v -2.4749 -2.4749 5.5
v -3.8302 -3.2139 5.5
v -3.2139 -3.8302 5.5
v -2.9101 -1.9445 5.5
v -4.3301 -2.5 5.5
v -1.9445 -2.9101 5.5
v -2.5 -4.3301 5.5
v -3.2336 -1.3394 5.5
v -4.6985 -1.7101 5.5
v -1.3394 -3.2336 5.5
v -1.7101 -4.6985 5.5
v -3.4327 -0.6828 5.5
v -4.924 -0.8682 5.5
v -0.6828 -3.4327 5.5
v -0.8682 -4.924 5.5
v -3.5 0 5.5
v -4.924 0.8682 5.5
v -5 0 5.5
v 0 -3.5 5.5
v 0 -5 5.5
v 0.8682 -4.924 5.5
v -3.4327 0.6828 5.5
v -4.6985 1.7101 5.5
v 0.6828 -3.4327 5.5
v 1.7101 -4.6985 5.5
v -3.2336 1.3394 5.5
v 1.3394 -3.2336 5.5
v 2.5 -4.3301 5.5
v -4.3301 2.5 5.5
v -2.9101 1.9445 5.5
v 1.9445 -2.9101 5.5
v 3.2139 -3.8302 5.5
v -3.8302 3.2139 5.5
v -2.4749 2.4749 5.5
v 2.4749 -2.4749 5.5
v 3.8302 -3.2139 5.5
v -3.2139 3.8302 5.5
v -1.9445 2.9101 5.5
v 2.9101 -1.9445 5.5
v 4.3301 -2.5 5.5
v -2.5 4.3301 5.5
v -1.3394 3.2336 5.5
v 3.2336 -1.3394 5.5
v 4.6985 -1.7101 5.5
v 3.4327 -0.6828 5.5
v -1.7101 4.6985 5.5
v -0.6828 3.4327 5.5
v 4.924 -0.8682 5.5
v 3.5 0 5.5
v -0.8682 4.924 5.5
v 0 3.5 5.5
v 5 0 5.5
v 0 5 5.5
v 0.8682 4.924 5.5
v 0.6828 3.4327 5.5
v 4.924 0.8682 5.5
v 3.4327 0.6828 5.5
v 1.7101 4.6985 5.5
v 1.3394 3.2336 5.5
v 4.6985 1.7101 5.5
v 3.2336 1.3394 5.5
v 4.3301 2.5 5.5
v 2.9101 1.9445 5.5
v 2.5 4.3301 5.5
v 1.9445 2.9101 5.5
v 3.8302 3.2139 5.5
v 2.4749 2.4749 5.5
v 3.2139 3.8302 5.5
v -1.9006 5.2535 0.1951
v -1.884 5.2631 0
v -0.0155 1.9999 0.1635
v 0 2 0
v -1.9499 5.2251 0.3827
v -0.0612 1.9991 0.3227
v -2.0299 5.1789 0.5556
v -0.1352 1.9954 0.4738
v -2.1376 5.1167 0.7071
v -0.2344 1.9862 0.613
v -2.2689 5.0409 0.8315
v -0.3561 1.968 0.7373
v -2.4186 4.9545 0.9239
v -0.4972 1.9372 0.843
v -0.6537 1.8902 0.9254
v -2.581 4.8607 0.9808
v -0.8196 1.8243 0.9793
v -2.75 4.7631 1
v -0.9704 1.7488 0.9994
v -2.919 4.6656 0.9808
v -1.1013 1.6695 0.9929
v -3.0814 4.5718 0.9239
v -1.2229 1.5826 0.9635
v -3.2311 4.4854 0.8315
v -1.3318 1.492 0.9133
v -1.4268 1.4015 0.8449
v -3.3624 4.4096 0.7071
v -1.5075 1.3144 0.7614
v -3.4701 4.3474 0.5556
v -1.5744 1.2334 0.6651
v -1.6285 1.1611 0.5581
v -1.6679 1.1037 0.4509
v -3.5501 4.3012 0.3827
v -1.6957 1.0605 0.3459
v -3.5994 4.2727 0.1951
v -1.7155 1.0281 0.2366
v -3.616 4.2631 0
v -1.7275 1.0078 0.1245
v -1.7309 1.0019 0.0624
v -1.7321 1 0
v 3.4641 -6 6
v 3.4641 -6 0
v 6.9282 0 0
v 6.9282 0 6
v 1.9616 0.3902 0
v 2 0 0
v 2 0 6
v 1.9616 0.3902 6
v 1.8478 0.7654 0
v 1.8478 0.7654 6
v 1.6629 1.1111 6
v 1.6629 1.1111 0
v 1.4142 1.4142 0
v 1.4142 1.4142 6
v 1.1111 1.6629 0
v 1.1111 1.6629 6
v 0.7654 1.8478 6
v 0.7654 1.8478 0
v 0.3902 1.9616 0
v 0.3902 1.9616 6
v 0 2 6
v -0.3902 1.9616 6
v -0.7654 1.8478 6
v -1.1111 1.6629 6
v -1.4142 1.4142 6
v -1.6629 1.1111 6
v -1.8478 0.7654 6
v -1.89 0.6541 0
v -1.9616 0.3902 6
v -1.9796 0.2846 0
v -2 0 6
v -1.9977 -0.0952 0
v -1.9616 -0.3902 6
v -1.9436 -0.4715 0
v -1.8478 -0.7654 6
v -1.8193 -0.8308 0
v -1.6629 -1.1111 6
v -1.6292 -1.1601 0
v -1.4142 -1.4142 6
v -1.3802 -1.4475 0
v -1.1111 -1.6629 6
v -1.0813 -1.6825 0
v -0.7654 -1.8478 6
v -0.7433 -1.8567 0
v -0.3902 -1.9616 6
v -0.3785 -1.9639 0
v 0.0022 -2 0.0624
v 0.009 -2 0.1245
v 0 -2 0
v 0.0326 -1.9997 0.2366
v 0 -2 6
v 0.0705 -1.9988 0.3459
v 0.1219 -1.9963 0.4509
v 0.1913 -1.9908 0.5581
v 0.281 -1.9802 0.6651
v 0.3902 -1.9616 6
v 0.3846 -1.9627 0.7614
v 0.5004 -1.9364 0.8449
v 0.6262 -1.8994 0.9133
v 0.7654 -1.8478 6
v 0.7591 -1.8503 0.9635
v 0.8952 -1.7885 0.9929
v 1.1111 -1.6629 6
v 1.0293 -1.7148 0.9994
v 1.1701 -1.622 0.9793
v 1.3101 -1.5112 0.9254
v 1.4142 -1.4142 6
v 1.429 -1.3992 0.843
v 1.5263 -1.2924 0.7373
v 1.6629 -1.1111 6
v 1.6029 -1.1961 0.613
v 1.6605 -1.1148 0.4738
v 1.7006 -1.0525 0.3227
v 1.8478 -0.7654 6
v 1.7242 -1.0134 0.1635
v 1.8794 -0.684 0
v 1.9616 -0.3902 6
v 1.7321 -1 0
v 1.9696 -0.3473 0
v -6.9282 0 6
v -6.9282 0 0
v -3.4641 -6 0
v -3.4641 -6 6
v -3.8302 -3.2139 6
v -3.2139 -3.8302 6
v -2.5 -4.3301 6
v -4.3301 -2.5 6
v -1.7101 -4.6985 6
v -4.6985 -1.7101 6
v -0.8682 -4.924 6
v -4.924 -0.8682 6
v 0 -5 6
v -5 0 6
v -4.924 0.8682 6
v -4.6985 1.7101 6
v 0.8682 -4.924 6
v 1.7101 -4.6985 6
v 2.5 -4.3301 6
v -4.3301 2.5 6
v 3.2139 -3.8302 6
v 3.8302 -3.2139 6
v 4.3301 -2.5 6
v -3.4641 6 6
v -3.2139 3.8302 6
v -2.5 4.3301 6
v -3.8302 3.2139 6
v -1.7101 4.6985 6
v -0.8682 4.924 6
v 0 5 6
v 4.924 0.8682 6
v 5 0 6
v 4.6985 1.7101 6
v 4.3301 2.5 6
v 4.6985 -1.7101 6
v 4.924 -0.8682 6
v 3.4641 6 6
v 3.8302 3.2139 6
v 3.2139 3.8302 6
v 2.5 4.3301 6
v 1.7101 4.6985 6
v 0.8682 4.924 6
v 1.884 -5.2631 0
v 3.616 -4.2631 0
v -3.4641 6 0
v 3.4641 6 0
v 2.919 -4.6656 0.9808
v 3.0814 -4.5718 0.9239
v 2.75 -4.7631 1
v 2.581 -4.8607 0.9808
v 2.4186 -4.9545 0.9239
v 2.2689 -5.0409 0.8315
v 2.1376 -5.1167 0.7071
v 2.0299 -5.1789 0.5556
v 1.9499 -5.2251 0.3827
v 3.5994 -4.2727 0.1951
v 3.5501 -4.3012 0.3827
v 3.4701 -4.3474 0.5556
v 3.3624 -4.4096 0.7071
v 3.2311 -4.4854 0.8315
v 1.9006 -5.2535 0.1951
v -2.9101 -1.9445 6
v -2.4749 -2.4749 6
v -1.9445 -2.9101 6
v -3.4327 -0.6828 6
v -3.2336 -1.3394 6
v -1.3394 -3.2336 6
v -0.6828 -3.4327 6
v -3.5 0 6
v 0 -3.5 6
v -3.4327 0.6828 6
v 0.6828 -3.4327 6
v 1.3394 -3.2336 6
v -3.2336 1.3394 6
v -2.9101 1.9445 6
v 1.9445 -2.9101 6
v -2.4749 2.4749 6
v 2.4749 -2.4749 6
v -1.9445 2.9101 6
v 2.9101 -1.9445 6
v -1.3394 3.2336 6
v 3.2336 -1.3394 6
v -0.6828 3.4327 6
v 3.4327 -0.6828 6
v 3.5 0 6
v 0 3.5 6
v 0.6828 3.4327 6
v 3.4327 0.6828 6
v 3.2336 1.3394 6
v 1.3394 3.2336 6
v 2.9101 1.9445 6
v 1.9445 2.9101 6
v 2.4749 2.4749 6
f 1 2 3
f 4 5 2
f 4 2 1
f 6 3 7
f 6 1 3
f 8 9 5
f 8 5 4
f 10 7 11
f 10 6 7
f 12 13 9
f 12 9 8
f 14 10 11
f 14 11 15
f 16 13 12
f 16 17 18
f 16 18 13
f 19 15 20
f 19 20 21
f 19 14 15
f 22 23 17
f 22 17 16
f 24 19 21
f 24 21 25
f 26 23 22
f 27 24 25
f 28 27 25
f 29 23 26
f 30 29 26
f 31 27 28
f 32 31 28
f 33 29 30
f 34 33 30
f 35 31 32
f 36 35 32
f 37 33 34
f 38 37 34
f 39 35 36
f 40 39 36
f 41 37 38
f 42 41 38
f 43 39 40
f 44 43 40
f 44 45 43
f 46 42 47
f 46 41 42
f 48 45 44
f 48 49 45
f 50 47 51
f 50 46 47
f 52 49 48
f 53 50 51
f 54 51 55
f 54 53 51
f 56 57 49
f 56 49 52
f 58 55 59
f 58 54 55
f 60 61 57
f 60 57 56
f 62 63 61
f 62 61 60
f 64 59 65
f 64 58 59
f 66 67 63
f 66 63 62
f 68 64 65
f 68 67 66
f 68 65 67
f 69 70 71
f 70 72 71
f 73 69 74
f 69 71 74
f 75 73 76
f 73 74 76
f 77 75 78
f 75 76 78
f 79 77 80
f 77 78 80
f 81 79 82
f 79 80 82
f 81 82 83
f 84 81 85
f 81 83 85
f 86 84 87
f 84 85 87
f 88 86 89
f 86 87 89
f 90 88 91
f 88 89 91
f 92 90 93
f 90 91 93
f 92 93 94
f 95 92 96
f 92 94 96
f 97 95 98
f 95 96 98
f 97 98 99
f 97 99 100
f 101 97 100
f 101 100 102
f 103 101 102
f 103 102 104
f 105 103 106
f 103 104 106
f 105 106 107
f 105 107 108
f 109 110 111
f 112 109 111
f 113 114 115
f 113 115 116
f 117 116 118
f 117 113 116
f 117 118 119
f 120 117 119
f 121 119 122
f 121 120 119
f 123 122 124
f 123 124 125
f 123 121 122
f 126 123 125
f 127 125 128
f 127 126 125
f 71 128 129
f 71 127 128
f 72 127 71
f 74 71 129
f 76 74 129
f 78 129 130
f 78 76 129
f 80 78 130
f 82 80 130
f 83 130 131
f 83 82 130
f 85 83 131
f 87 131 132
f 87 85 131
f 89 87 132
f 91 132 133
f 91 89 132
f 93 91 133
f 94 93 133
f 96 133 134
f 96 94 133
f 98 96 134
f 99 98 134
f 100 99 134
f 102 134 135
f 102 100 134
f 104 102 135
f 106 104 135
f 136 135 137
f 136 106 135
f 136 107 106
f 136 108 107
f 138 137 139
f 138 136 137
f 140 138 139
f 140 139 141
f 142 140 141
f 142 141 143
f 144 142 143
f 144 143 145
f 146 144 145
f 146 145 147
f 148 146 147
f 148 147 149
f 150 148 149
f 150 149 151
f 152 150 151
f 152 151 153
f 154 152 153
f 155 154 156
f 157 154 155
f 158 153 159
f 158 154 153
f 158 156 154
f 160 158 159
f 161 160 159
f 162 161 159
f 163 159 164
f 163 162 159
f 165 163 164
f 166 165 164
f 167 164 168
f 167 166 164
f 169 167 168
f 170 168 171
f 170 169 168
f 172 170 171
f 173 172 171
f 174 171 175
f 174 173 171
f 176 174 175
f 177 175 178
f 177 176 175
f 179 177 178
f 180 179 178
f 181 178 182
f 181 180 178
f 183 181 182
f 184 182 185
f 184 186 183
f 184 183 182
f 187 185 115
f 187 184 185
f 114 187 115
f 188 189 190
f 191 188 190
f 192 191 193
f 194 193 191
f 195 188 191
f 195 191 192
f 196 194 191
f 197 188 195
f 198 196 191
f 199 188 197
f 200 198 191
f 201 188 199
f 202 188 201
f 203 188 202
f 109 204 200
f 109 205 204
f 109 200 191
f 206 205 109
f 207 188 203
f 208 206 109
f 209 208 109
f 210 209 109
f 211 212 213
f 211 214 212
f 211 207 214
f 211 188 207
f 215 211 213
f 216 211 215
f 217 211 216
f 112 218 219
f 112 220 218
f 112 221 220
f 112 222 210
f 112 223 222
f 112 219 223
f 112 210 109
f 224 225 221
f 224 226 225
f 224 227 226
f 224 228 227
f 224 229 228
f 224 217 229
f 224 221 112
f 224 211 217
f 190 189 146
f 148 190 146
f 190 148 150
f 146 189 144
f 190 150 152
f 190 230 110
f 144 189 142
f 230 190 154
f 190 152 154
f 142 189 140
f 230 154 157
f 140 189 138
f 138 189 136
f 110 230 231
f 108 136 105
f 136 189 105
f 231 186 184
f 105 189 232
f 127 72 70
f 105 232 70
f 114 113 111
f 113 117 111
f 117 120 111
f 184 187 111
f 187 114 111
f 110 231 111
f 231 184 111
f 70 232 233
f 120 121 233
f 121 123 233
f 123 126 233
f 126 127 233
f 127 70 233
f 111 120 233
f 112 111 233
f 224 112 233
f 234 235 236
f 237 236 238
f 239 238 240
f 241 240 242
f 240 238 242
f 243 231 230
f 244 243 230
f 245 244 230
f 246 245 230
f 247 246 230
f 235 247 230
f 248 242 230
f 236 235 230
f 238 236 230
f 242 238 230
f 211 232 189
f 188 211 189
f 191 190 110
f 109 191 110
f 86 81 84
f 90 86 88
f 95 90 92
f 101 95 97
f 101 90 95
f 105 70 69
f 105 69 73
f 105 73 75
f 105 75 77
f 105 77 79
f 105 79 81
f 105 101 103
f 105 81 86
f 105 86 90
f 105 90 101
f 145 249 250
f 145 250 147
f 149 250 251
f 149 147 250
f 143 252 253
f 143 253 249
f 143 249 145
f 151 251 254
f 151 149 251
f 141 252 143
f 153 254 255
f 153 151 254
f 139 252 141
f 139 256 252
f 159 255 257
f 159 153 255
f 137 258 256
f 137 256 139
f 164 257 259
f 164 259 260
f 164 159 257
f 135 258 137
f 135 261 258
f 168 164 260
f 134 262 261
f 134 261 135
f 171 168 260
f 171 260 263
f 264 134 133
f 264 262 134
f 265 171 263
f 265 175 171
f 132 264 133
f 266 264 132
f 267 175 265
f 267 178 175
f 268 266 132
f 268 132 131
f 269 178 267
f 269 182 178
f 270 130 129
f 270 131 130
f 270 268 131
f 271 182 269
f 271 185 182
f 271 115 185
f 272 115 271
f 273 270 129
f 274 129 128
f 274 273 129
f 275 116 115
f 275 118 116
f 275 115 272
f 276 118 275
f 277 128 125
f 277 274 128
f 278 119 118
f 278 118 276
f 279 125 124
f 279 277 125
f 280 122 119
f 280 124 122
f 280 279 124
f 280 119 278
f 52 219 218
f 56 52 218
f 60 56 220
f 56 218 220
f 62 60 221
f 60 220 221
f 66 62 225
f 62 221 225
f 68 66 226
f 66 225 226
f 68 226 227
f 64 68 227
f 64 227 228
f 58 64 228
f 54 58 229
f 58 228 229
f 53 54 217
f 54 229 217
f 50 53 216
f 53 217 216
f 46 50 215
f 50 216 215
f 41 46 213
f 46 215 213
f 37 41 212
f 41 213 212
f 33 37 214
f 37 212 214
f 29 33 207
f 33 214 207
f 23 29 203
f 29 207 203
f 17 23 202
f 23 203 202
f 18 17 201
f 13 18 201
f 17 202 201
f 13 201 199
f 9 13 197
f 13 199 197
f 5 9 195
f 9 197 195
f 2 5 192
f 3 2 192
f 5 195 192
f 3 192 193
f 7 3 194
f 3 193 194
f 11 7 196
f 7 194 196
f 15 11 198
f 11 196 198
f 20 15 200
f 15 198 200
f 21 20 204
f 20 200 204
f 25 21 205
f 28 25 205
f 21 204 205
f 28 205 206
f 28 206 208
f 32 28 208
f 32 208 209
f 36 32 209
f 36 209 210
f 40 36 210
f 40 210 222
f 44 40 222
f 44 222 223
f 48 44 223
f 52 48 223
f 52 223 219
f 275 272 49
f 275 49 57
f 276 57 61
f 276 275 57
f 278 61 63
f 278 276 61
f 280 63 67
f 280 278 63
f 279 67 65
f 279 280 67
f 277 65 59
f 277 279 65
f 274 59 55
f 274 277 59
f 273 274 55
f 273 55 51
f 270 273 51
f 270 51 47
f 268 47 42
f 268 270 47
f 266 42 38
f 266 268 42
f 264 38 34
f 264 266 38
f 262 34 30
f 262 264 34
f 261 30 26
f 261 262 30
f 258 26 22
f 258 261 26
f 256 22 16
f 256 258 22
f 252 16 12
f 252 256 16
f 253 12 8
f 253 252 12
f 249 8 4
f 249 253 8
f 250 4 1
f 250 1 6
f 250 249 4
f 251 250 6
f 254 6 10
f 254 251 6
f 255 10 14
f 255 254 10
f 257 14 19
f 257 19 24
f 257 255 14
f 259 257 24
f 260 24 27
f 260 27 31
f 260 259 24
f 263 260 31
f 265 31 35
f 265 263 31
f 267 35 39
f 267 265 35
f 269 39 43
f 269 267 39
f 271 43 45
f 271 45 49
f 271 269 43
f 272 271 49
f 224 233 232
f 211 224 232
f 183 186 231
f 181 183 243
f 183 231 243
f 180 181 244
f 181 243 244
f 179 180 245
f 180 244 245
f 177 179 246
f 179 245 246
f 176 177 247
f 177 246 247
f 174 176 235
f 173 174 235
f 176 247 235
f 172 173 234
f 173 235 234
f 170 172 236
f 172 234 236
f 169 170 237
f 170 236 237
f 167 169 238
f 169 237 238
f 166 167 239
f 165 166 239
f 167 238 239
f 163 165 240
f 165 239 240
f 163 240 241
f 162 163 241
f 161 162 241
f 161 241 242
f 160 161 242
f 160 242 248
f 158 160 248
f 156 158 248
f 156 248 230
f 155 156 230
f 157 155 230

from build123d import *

# Parameters (mm, degrees)
SKETCH_1_R          = 2
EXTRUDE_1_DEPTH     = 6
SKETCH_2_R          = 5
SKETCH_2_R_2        = 3.5
CUT_EXTRUDE_1_DEPTH = 0.5
SKETCH_3_R          = 1
CUT_EXTRUDE_2_DEPTH = 5.5


with BuildPart() as part:
    # 草图1 → 凸台-拉伸1 (new body)
    with BuildSketch(Plane.XY):
        Polygon((3.464101615, -6), (6.92820323, 0), (3.464101615, 6), (-3.464101615, 6), (-6.92820323, 0), (-3.464101615, -6), align=None)
        Circle(SKETCH_1_R, mode=Mode.SUBTRACT)
    extrude(amount=EXTRUDE_1_DEPTH)

    # 草图2 → 切除-拉伸1 (cut)
    with BuildSketch(Plane.XY.offset(6)):
        Circle(SKETCH_2_R)
        Circle(SKETCH_2_R_2, mode=Mode.SUBTRACT)
    extrude(amount=-CUT_EXTRUDE_1_DEPTH, mode=Mode.SUBTRACT)

    # 草图3 → 切除-拉伸2 (cut, symmetric)
    with BuildSketch(Plane(origin=(0, 0, 0), x_dir=(-0.8660254037844387, -0.49999999999999983, 0), z_dir=(0.49999999999999983, -0.8660254037844387, 0))):
        Circle(SKETCH_3_R)
    extrude(amount=CUT_EXTRUDE_2_DEPTH, both=True, mode=Mode.SUBTRACT)


solid = part.part
